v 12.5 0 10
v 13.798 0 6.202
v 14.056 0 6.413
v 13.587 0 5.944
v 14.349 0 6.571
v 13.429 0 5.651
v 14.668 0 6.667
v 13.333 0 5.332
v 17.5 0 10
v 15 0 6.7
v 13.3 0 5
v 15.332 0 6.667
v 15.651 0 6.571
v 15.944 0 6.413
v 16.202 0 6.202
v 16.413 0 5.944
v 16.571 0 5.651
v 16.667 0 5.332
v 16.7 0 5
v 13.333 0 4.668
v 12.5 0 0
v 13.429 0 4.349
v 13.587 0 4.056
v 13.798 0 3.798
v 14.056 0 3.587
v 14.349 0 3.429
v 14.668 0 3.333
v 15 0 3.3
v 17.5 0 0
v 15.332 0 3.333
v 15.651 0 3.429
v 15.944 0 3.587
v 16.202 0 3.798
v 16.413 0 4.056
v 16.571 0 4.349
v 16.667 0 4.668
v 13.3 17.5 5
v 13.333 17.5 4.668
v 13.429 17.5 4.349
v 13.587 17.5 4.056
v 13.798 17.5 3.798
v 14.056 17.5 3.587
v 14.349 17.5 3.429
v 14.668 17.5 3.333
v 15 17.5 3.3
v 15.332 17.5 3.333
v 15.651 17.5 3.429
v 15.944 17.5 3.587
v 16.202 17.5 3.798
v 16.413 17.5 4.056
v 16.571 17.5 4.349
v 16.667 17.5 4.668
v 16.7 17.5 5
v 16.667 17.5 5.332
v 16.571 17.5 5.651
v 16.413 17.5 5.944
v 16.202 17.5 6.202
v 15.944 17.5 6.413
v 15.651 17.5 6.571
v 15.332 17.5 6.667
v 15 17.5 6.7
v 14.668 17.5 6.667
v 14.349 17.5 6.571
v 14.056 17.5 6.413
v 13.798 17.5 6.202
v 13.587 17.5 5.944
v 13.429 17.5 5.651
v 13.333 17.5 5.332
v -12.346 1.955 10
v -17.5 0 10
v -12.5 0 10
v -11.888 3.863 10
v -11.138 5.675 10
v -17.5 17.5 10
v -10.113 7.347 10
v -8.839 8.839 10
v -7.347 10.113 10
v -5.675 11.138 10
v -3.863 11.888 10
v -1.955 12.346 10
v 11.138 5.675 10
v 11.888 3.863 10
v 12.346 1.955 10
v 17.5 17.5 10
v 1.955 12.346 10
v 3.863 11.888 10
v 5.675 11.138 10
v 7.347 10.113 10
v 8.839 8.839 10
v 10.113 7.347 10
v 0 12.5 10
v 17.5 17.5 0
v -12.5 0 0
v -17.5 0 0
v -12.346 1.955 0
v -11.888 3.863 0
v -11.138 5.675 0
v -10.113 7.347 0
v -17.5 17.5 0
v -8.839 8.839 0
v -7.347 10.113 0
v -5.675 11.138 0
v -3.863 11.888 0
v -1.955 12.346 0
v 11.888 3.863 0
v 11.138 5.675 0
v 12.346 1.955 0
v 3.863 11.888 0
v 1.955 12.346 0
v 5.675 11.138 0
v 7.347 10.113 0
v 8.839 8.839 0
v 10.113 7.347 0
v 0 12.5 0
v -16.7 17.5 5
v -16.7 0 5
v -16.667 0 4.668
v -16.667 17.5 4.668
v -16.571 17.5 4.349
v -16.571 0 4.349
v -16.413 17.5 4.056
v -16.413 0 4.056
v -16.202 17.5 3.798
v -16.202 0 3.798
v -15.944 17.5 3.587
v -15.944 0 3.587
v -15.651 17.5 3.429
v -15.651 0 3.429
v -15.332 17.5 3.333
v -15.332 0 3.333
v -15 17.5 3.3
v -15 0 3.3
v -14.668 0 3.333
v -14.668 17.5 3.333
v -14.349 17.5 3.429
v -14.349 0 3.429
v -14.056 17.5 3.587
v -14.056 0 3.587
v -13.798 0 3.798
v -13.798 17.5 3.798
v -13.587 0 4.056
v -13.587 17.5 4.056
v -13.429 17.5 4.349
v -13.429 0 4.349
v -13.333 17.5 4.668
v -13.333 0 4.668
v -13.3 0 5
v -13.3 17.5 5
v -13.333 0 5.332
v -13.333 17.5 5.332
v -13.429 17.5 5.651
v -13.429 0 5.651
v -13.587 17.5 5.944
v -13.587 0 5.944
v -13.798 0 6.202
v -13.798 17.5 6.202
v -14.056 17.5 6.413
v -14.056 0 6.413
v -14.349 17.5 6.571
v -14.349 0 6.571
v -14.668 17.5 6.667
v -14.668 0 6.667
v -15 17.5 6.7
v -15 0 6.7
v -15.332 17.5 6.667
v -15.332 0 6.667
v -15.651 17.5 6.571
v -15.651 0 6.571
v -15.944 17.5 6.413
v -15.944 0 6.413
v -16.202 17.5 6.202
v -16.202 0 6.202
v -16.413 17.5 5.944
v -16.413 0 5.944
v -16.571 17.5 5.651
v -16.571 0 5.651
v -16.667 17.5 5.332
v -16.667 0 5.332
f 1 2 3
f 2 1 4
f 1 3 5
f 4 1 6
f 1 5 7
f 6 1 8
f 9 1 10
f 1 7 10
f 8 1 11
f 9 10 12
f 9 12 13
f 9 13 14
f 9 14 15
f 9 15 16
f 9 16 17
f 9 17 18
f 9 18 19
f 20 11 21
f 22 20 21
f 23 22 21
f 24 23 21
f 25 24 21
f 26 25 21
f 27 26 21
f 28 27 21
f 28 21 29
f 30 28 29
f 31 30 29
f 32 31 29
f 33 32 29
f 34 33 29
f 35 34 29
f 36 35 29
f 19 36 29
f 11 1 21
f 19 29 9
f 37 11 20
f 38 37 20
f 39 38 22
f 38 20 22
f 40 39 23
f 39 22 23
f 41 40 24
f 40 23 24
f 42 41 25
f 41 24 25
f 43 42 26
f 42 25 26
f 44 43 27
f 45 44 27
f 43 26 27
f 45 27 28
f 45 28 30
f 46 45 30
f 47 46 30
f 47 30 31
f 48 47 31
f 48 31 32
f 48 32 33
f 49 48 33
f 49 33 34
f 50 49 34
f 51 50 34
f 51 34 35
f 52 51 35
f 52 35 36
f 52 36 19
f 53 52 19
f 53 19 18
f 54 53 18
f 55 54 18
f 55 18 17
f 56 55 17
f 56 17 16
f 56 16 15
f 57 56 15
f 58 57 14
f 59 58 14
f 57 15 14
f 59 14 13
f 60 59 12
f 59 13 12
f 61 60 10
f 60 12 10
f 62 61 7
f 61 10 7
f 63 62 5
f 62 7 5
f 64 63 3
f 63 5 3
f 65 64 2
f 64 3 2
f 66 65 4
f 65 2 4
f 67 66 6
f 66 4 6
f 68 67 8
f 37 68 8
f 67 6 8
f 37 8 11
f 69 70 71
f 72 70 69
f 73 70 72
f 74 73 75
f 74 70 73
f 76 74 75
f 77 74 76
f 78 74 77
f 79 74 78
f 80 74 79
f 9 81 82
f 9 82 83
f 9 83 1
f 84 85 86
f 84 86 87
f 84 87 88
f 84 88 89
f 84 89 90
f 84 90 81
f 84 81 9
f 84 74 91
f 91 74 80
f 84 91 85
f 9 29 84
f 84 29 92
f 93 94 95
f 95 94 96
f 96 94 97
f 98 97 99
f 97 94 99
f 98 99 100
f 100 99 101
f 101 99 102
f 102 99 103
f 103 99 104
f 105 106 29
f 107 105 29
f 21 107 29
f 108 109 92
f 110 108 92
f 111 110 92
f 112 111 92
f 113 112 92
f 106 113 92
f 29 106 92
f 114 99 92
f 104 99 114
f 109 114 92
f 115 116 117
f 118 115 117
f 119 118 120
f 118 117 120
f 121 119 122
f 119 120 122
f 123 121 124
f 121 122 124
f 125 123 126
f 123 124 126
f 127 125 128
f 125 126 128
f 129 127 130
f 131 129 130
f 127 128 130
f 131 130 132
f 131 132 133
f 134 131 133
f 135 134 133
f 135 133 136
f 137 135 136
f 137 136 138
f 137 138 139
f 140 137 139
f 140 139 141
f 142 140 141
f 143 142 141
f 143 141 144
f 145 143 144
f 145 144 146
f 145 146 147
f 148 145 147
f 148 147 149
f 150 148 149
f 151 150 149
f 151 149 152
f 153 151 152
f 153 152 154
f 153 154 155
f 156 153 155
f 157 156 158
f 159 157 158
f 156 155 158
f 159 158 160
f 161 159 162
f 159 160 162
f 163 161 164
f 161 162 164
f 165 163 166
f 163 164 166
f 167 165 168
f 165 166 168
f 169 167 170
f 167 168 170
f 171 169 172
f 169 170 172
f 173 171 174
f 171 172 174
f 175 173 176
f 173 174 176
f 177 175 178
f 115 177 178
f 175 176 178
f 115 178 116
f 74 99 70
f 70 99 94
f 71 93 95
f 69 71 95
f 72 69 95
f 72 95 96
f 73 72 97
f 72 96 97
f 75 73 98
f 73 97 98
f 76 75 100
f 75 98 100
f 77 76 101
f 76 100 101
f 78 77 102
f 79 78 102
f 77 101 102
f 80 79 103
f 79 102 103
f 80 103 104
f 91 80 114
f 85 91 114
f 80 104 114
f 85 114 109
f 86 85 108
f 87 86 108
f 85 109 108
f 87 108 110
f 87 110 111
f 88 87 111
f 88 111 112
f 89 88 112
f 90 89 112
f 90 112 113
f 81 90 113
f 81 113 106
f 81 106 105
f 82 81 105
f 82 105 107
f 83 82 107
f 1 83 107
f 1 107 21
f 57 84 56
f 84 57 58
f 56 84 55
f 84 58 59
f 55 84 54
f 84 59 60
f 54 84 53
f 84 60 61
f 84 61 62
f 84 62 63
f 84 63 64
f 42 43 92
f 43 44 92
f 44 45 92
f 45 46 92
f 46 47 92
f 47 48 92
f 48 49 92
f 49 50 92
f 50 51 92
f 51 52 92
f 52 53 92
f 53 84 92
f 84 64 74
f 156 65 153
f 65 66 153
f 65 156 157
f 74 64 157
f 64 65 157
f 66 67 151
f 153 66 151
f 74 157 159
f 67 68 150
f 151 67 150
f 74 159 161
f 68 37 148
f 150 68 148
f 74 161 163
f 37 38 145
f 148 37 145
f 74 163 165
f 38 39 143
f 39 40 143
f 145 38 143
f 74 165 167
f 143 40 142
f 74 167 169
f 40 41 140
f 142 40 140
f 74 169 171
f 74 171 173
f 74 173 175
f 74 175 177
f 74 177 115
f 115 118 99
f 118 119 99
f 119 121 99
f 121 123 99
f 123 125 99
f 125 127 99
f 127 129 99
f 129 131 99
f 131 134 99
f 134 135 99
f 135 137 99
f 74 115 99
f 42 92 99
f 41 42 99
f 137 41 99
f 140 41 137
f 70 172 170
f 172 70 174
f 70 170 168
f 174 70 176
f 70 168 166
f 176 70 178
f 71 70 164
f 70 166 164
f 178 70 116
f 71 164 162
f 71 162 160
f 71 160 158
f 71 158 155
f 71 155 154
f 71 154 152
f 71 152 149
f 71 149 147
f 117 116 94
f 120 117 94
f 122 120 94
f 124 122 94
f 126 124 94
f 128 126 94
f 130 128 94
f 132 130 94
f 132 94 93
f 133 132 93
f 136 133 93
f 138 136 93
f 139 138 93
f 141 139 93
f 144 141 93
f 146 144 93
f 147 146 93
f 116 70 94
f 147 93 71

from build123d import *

# Parameters (mm, degrees)
BOSS_EXTRUDE1_DEPTH  = 10
M3_CLEARANCE_HOLE1_D = 3.4


with BuildPart() as part:
    # Sketch2 → Boss-Extrude1 (new body)
    with BuildSketch(Plane.XY):
        with BuildLine():
            Line((12.5, 0), (17.5, 0))
            Line((17.5, 0), (17.5, 17.5))
            Line((17.5, 17.5), (-17.5, 17.5))
            Line((-17.5, 17.5), (-17.5, 0))
            Line((-17.5, 0), (-12.5, 0))
            ThreePointArc((-12.5, 0), (0, 12.5), (12.5, 0))
        make_face()
    extrude(amount=BOSS_EXTRUDE1_DEPTH)

    # M3 Clearance Hole1 (through all)
    with Locations(Plane(origin=(0, 17.5, 0), x_dir=(1, 0, 0), z_dir=(0, 1, 0))):
        with Locations((-15, -5), (15, -5)):
            Hole(M3_CLEARANCE_HOLE1_D / 2)


solid = part.part
